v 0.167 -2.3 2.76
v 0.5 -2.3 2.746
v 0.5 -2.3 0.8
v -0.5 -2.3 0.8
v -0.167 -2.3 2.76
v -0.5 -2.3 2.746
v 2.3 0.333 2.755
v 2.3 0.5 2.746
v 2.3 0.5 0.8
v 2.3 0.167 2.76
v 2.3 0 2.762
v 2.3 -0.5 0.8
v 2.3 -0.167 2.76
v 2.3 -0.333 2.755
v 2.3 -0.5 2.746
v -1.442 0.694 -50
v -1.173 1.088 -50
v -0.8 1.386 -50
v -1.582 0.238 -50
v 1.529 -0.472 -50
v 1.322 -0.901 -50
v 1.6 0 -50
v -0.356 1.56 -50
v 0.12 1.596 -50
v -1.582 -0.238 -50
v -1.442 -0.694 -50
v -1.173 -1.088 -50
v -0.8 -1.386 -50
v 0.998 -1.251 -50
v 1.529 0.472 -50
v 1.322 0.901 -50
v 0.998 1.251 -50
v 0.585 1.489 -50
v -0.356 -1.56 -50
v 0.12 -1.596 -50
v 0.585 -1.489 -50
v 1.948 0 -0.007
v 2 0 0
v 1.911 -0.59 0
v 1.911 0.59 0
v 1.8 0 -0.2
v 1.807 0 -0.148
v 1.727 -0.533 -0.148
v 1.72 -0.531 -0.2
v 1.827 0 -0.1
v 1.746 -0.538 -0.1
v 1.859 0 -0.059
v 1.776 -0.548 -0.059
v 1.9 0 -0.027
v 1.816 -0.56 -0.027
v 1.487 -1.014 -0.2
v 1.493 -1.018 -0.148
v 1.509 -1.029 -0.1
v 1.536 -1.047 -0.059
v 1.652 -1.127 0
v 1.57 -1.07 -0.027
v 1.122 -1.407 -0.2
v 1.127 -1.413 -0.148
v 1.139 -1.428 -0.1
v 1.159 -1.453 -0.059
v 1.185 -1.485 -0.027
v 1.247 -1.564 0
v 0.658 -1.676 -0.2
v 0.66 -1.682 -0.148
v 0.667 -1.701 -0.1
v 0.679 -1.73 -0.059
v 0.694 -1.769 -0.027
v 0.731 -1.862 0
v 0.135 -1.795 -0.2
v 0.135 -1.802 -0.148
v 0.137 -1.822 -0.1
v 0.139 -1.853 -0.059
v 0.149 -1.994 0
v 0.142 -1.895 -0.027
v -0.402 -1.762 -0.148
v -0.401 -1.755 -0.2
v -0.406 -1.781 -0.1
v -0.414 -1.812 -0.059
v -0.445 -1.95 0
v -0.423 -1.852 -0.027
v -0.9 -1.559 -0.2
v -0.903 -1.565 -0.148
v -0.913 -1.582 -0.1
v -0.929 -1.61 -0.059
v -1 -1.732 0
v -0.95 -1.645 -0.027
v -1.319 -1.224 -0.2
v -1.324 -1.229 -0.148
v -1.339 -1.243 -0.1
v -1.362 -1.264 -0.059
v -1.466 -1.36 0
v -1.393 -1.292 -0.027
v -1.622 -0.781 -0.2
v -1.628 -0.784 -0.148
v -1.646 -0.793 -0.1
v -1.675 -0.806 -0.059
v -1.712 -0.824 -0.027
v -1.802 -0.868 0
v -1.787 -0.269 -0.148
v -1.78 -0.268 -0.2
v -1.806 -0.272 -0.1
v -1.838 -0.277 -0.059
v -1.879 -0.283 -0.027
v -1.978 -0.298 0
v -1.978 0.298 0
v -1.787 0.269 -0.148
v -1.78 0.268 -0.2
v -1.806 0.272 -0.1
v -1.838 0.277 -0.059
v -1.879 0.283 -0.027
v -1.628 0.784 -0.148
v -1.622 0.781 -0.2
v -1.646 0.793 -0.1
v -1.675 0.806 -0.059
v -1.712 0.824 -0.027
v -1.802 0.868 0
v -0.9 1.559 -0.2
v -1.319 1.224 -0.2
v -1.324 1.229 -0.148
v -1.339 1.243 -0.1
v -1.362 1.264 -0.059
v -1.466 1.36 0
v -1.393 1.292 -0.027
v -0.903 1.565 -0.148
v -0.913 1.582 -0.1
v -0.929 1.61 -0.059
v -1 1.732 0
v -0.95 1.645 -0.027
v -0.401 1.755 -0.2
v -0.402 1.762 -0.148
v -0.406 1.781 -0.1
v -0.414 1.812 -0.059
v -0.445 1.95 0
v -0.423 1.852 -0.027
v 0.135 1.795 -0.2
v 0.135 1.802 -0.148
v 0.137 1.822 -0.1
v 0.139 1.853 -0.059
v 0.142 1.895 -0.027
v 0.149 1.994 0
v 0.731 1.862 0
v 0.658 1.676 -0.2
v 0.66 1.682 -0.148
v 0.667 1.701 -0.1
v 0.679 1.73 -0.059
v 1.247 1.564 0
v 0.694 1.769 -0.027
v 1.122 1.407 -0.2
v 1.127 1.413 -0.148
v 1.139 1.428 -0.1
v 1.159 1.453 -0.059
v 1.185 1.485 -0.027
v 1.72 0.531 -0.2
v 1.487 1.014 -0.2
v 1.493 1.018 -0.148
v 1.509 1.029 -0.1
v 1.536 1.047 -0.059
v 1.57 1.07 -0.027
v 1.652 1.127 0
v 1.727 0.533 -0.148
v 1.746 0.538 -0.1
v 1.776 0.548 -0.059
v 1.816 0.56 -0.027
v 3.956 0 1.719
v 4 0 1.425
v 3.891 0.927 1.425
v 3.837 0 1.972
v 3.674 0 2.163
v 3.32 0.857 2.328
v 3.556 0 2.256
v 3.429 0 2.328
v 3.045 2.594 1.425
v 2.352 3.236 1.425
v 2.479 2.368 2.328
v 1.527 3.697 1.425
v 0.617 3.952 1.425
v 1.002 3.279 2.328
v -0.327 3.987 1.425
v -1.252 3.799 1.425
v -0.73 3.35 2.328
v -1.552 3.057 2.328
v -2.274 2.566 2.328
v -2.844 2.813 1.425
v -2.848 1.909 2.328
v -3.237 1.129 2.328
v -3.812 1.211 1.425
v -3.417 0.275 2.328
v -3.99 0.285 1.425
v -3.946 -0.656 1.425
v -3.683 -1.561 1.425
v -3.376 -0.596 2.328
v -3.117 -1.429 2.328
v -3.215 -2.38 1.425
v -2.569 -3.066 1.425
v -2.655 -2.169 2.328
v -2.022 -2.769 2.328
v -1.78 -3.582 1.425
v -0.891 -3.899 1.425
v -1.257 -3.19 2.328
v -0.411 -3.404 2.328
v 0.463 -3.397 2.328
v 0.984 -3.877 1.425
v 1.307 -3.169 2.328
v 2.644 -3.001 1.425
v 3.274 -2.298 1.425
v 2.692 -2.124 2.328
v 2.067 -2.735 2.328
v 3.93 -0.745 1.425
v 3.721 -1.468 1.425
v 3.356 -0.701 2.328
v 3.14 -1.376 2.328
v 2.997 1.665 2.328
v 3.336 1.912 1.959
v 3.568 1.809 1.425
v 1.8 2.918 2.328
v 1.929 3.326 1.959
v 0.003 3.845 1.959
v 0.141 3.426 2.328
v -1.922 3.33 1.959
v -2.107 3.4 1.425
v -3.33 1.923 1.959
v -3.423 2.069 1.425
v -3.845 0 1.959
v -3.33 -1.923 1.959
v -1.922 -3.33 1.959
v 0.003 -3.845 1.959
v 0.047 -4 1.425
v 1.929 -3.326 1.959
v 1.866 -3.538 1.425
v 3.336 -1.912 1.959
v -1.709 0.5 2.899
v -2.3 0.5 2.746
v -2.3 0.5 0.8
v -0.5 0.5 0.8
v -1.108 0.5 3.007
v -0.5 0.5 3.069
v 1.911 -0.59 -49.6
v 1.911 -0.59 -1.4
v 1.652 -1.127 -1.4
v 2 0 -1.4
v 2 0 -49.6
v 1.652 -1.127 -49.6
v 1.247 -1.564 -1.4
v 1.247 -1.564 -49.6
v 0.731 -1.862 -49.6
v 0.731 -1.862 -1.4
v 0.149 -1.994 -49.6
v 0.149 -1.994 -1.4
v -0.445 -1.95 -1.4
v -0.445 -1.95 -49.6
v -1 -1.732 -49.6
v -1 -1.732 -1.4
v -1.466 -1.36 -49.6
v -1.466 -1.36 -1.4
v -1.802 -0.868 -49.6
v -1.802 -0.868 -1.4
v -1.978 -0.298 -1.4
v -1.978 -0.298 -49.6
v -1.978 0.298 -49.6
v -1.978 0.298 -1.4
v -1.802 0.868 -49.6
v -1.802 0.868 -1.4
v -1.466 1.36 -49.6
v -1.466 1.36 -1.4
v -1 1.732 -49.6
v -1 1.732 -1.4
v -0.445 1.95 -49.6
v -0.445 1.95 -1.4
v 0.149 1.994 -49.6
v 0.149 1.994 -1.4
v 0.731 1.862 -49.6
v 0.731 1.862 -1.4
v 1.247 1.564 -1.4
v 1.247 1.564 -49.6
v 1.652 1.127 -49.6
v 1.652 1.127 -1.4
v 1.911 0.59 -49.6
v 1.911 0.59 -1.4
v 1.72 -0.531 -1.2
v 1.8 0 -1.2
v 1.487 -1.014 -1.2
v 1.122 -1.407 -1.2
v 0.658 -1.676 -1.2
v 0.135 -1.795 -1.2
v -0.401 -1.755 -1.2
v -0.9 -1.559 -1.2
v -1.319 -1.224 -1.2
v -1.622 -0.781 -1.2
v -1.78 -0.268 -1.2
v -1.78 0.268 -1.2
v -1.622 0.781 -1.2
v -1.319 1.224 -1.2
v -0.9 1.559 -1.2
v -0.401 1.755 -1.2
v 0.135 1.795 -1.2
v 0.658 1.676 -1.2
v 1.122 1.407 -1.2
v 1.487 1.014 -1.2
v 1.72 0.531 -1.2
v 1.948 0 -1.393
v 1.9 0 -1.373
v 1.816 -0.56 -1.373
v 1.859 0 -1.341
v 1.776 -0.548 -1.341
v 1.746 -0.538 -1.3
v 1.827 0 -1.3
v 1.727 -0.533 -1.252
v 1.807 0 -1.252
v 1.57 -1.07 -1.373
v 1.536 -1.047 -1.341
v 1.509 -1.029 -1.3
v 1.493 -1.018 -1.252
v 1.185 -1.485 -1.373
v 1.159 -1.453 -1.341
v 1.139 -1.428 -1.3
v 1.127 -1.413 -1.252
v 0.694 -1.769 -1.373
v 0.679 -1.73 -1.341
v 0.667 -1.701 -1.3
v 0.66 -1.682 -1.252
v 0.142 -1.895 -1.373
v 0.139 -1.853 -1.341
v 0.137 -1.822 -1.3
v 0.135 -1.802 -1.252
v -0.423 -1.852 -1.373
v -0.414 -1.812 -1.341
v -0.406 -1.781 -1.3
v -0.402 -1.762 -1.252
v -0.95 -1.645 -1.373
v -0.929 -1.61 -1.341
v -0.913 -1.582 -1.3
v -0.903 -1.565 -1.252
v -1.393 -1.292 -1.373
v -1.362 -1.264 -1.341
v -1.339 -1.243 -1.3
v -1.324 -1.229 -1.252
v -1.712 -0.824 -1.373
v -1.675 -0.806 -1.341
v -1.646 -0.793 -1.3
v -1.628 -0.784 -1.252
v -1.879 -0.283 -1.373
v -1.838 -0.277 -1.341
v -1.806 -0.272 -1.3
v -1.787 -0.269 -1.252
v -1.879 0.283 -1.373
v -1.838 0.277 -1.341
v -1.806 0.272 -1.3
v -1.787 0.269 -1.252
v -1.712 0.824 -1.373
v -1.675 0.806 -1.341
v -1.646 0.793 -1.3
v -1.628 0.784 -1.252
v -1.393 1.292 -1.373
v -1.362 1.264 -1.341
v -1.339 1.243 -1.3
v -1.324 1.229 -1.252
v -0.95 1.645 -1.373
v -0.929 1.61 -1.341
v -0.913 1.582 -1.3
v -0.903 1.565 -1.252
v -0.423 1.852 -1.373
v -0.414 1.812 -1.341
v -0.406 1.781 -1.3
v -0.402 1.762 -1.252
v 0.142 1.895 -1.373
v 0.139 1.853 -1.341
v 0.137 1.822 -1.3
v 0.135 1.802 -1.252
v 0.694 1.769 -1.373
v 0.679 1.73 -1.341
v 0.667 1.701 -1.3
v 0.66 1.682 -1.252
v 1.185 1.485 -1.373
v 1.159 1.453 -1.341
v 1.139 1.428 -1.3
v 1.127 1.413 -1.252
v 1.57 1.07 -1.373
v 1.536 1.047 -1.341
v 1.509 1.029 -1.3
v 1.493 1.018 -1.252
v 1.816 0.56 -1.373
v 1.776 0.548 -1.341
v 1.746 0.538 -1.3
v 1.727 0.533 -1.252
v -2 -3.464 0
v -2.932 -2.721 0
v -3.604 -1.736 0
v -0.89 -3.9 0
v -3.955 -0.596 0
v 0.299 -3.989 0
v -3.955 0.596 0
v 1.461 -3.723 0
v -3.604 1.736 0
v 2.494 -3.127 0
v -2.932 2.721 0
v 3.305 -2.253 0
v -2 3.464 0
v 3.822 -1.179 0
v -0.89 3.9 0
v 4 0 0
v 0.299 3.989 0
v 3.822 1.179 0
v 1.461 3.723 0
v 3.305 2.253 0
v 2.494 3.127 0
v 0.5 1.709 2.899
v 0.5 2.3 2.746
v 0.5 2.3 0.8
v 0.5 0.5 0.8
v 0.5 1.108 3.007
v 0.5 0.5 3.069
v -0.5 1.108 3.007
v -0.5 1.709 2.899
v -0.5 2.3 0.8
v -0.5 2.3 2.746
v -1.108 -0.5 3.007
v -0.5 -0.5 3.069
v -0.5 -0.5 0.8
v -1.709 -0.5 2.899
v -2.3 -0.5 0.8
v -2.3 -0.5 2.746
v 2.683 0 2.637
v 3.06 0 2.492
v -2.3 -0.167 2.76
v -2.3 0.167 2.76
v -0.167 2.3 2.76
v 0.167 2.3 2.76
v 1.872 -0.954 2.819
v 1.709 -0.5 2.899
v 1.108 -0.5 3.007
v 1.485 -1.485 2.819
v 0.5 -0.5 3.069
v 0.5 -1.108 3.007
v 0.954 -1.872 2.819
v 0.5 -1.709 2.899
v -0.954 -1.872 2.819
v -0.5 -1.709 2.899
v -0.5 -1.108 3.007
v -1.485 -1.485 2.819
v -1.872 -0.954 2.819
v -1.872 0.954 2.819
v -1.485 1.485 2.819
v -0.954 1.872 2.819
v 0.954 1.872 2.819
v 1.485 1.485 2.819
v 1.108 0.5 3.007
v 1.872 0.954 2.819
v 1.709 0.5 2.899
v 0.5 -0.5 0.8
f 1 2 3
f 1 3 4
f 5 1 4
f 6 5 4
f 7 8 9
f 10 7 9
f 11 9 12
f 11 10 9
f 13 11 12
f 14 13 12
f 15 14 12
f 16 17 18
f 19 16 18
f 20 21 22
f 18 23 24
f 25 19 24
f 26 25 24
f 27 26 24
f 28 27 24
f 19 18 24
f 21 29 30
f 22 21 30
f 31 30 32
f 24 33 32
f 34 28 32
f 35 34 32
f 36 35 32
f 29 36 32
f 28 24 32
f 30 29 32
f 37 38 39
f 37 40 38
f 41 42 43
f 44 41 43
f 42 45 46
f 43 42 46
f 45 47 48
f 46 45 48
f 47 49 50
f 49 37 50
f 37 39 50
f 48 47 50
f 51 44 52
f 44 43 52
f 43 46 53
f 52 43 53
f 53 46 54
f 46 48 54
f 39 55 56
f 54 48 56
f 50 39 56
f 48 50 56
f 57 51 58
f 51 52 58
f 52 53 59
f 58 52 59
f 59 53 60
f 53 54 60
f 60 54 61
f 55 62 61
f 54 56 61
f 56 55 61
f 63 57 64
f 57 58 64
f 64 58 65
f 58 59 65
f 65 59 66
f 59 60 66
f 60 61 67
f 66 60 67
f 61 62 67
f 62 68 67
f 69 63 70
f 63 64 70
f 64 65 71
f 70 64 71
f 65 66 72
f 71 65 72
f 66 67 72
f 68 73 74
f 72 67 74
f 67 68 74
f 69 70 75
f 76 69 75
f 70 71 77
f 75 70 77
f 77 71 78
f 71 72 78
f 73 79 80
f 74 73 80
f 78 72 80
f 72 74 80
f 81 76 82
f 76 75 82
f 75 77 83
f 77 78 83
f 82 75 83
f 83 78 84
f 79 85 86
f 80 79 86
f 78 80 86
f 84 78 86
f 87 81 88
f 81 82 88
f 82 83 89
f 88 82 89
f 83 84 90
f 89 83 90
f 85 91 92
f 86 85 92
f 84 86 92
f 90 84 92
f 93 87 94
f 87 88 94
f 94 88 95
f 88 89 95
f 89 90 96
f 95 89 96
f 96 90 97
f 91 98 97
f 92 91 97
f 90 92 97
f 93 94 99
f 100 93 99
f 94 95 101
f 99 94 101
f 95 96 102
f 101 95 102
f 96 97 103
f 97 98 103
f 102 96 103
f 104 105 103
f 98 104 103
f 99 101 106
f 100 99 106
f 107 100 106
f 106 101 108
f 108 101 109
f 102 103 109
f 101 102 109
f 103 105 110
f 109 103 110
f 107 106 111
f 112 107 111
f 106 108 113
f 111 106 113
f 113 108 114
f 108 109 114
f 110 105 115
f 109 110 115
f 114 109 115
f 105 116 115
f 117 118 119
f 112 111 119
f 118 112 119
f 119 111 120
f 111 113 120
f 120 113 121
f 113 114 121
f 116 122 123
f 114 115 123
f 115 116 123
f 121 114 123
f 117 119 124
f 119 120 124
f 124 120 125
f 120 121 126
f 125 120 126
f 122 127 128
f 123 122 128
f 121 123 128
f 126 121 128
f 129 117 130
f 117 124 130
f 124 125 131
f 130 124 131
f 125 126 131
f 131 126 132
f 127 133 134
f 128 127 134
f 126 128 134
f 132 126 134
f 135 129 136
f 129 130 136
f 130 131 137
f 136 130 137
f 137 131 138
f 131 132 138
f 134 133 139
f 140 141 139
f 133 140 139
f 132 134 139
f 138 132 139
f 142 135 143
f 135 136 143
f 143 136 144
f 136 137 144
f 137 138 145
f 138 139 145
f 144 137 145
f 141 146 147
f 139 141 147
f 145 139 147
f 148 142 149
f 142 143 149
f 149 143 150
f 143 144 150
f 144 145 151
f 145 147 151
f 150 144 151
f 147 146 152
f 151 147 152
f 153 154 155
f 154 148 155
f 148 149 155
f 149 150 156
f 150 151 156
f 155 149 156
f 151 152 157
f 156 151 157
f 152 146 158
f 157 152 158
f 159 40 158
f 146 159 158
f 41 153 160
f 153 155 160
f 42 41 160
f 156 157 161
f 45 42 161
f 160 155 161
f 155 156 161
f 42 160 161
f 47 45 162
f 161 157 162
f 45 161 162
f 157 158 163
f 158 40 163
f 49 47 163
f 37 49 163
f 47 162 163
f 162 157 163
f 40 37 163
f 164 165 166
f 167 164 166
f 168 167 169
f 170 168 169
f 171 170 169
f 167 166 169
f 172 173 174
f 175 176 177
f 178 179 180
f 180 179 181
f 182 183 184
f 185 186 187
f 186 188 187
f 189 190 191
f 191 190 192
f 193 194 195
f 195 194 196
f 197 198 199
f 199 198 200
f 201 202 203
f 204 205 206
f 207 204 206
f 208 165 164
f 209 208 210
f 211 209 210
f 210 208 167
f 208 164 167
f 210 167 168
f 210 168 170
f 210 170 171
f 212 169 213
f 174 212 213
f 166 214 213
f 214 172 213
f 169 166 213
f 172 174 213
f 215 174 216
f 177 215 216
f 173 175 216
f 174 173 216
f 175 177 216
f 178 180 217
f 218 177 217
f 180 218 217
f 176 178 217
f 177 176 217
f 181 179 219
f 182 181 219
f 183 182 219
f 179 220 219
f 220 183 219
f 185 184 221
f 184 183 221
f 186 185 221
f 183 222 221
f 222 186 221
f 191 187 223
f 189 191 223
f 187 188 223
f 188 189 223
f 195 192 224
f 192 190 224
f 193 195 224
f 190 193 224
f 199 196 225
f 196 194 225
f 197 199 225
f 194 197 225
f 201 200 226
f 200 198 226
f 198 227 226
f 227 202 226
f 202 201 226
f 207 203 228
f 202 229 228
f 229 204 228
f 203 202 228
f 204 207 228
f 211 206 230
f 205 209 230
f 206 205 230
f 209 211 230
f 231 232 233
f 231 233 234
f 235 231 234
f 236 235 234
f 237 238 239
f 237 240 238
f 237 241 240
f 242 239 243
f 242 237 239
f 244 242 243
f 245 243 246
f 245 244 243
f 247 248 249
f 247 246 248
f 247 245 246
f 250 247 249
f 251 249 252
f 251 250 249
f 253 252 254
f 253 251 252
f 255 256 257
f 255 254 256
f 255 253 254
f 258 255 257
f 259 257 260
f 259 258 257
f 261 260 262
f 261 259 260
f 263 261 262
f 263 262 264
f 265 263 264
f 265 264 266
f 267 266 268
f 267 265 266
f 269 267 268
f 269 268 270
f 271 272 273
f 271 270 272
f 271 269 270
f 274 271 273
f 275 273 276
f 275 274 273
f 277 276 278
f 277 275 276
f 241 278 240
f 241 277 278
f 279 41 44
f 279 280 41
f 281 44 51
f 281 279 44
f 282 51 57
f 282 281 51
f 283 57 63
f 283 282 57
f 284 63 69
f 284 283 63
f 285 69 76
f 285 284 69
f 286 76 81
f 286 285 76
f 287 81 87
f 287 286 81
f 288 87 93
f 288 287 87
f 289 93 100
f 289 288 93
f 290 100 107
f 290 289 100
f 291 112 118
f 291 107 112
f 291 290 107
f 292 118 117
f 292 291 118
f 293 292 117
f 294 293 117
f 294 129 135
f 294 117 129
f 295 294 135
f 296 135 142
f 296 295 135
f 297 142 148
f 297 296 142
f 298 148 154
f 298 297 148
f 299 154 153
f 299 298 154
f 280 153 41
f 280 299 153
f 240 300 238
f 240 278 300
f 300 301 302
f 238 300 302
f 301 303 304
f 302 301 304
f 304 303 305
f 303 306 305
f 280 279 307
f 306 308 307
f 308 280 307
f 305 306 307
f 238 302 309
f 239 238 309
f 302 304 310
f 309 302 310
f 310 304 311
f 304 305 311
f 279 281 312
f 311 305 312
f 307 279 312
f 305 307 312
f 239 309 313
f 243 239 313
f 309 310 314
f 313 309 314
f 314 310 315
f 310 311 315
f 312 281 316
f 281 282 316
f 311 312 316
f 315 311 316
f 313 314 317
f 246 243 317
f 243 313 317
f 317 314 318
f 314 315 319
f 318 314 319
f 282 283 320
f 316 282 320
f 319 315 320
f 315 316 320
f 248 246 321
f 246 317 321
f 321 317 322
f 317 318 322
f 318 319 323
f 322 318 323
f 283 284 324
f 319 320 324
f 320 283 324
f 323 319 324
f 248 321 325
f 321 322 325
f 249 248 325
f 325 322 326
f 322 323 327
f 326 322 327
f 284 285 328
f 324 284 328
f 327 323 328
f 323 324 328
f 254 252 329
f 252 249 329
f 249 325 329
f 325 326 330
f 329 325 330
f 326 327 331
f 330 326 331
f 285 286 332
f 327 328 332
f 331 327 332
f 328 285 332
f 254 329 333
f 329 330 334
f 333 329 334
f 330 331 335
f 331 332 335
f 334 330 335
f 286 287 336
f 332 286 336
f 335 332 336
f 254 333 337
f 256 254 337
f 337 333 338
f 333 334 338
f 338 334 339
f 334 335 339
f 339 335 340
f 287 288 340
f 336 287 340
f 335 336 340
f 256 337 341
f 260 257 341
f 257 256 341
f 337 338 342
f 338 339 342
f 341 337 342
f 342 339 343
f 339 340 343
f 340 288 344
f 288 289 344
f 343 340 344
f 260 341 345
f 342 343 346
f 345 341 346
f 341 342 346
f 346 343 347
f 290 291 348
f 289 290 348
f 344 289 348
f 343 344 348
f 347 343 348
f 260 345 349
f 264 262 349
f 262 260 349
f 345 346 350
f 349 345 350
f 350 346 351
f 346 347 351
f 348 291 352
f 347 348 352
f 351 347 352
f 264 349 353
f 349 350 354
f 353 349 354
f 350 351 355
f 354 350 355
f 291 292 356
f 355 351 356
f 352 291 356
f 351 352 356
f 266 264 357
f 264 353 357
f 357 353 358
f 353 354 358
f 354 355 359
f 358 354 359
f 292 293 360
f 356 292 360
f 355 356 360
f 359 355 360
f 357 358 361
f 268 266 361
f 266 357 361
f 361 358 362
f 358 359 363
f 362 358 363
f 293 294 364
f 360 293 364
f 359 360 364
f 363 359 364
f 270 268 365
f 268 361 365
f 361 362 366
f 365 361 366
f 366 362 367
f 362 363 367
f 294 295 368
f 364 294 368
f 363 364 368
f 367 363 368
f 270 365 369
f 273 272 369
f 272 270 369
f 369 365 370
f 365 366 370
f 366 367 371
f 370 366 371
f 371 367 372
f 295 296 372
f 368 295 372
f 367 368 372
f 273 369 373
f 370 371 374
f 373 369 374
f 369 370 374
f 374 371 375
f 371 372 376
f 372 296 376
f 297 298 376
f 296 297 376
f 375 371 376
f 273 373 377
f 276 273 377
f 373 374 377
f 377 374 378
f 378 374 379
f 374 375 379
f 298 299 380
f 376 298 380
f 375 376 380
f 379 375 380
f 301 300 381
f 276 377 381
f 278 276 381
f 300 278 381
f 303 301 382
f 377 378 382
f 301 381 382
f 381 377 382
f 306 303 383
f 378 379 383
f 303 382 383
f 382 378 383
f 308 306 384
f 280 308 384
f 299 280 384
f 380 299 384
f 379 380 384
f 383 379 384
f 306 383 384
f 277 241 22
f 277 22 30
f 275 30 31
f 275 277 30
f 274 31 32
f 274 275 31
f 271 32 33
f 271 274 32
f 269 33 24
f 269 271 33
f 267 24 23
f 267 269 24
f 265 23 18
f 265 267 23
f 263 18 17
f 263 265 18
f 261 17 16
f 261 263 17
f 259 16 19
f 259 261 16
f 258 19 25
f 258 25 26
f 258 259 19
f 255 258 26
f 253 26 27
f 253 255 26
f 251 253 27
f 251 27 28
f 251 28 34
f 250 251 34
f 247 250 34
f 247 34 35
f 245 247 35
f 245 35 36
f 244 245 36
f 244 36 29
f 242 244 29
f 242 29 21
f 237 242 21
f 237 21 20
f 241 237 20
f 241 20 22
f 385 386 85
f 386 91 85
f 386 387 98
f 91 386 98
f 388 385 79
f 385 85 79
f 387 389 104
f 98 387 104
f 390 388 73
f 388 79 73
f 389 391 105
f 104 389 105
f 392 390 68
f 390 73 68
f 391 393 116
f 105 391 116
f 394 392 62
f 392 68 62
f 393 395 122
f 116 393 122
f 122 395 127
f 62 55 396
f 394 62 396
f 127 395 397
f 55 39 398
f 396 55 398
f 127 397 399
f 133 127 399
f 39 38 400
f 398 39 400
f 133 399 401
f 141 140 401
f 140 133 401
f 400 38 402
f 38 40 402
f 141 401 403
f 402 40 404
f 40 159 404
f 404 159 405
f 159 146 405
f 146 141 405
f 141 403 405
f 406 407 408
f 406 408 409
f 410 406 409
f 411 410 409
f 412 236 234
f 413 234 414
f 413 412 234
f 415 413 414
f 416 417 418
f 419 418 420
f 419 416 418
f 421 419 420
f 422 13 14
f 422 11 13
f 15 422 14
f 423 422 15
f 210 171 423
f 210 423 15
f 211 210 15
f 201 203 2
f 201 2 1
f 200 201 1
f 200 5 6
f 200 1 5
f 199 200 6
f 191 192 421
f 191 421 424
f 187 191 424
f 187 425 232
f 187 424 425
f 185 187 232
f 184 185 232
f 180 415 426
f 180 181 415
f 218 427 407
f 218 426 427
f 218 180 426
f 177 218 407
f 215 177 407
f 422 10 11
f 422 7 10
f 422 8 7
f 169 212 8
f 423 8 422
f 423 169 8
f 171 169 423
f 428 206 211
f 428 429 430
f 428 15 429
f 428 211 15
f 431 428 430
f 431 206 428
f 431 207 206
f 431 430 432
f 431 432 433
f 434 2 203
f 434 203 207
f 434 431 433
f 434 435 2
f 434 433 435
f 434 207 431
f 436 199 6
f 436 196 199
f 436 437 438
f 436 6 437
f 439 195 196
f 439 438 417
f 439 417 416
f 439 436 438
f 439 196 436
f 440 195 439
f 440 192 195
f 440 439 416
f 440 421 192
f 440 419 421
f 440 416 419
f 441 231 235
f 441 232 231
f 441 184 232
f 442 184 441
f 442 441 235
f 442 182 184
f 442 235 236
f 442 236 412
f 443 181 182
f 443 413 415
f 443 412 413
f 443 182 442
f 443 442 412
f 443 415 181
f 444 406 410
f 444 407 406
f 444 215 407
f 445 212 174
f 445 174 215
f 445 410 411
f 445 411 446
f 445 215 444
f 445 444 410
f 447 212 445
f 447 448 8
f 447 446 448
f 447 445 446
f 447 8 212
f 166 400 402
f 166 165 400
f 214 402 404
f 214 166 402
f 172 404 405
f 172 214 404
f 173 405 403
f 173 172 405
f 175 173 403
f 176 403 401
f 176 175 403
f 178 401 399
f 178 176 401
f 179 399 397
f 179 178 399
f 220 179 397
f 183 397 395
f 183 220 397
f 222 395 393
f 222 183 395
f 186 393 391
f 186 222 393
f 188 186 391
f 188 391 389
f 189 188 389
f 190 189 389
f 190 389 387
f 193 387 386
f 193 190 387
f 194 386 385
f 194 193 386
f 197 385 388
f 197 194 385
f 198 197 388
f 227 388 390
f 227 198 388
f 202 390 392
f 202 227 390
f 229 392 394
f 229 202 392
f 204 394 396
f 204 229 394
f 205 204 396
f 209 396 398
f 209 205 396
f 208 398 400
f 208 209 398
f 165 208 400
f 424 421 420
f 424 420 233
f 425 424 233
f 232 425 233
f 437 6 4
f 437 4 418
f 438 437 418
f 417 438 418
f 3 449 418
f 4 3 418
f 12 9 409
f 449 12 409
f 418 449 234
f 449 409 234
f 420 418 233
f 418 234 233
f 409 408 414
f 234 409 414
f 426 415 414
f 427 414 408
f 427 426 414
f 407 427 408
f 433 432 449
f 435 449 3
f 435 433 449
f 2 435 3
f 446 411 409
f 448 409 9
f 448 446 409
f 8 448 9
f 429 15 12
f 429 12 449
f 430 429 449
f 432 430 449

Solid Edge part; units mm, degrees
sketch "Sketch1" plane through (0, 0, 0) normal (0, -1, 0) x (1, 0, 0)
  line L0 (4, 0) -> (1.8, 0)
  line L1 (1.8, 0) -> (1.8, -1.4)
  line L2 (1.8, -1.4) -> (2, -1.4)
  line L3 (2, -1.4) -> (2, -50)
  line L4 (2, -50) -> (0, -50)
  arc A0 (0, 3.1) -> (4, 2.0282) centre (0, -4.9) cw
  line L5 (4, 0) -> (4, 2.0282)
  dimension "D1" = 50
  dimension "D2" = 1.4
  dimension "D3" = 0.2
  dimension "D4" = 8
  dimension "D5" = 3.1
revolve "RevolvedProtrusion1" add sketch "Sketch1" angle 360 about axis through (0, 0, -6) along (0, 0, 1)
cosmetic_thread "Thread1" size "M4"
chamfer "Chamfer_1" distance 0.4 angle 45 1 edges at (-2, 0, -50)
fillet "Round1" radius 0.2 2 edges at (-1.8, 0, -1.4) (-1.8, 0, 0)
fillet "Round_3" radius 1 1 edges at (-4, 0, 2.0282)
sketch "Sketch2" plane through (0, 0, 3.1) normal (0, 0, 1) x (1, 0, 0)
  line L0 (-0.5, 0.5) -> (-0.5, 2.3)
  line L1 (-0.5, 2.3) -> (0.5, 2.3)
  line L2 (0.5, 2.3) -> (0.5, 0.5)
  line L3 (0.5, 0.5) -> (2.3, 0.5)
  line L4 (2.3, 0.5) -> (2.3, -0.5)
  line L5 (2.3, -0.5) -> (0.5, -0.5)
  line L6 (0.5, -0.5) -> (0.5, -2.3)
  line L7 (0.5, -2.3) -> (-0.5, -2.3)
  line L8 (-0.5, -2.3) -> (-0.5, -0.5)
  line L9 (-0.5, -0.5) -> (-2.3, -0.5)
  line L10 (-2.3, -0.5) -> (-2.3, 0.5)
  line L11 (-2.3, 0.5) -> (-0.5, 0.5)
  dimension "D1" = 4.6
  dimension "D2" = 1
extrude "ExtrudedCutout_2" cut sketch "Sketch2" against normal blind 2.3
properties part number "STD-DIN_7985-M4x50" material "Galvanized steel"
